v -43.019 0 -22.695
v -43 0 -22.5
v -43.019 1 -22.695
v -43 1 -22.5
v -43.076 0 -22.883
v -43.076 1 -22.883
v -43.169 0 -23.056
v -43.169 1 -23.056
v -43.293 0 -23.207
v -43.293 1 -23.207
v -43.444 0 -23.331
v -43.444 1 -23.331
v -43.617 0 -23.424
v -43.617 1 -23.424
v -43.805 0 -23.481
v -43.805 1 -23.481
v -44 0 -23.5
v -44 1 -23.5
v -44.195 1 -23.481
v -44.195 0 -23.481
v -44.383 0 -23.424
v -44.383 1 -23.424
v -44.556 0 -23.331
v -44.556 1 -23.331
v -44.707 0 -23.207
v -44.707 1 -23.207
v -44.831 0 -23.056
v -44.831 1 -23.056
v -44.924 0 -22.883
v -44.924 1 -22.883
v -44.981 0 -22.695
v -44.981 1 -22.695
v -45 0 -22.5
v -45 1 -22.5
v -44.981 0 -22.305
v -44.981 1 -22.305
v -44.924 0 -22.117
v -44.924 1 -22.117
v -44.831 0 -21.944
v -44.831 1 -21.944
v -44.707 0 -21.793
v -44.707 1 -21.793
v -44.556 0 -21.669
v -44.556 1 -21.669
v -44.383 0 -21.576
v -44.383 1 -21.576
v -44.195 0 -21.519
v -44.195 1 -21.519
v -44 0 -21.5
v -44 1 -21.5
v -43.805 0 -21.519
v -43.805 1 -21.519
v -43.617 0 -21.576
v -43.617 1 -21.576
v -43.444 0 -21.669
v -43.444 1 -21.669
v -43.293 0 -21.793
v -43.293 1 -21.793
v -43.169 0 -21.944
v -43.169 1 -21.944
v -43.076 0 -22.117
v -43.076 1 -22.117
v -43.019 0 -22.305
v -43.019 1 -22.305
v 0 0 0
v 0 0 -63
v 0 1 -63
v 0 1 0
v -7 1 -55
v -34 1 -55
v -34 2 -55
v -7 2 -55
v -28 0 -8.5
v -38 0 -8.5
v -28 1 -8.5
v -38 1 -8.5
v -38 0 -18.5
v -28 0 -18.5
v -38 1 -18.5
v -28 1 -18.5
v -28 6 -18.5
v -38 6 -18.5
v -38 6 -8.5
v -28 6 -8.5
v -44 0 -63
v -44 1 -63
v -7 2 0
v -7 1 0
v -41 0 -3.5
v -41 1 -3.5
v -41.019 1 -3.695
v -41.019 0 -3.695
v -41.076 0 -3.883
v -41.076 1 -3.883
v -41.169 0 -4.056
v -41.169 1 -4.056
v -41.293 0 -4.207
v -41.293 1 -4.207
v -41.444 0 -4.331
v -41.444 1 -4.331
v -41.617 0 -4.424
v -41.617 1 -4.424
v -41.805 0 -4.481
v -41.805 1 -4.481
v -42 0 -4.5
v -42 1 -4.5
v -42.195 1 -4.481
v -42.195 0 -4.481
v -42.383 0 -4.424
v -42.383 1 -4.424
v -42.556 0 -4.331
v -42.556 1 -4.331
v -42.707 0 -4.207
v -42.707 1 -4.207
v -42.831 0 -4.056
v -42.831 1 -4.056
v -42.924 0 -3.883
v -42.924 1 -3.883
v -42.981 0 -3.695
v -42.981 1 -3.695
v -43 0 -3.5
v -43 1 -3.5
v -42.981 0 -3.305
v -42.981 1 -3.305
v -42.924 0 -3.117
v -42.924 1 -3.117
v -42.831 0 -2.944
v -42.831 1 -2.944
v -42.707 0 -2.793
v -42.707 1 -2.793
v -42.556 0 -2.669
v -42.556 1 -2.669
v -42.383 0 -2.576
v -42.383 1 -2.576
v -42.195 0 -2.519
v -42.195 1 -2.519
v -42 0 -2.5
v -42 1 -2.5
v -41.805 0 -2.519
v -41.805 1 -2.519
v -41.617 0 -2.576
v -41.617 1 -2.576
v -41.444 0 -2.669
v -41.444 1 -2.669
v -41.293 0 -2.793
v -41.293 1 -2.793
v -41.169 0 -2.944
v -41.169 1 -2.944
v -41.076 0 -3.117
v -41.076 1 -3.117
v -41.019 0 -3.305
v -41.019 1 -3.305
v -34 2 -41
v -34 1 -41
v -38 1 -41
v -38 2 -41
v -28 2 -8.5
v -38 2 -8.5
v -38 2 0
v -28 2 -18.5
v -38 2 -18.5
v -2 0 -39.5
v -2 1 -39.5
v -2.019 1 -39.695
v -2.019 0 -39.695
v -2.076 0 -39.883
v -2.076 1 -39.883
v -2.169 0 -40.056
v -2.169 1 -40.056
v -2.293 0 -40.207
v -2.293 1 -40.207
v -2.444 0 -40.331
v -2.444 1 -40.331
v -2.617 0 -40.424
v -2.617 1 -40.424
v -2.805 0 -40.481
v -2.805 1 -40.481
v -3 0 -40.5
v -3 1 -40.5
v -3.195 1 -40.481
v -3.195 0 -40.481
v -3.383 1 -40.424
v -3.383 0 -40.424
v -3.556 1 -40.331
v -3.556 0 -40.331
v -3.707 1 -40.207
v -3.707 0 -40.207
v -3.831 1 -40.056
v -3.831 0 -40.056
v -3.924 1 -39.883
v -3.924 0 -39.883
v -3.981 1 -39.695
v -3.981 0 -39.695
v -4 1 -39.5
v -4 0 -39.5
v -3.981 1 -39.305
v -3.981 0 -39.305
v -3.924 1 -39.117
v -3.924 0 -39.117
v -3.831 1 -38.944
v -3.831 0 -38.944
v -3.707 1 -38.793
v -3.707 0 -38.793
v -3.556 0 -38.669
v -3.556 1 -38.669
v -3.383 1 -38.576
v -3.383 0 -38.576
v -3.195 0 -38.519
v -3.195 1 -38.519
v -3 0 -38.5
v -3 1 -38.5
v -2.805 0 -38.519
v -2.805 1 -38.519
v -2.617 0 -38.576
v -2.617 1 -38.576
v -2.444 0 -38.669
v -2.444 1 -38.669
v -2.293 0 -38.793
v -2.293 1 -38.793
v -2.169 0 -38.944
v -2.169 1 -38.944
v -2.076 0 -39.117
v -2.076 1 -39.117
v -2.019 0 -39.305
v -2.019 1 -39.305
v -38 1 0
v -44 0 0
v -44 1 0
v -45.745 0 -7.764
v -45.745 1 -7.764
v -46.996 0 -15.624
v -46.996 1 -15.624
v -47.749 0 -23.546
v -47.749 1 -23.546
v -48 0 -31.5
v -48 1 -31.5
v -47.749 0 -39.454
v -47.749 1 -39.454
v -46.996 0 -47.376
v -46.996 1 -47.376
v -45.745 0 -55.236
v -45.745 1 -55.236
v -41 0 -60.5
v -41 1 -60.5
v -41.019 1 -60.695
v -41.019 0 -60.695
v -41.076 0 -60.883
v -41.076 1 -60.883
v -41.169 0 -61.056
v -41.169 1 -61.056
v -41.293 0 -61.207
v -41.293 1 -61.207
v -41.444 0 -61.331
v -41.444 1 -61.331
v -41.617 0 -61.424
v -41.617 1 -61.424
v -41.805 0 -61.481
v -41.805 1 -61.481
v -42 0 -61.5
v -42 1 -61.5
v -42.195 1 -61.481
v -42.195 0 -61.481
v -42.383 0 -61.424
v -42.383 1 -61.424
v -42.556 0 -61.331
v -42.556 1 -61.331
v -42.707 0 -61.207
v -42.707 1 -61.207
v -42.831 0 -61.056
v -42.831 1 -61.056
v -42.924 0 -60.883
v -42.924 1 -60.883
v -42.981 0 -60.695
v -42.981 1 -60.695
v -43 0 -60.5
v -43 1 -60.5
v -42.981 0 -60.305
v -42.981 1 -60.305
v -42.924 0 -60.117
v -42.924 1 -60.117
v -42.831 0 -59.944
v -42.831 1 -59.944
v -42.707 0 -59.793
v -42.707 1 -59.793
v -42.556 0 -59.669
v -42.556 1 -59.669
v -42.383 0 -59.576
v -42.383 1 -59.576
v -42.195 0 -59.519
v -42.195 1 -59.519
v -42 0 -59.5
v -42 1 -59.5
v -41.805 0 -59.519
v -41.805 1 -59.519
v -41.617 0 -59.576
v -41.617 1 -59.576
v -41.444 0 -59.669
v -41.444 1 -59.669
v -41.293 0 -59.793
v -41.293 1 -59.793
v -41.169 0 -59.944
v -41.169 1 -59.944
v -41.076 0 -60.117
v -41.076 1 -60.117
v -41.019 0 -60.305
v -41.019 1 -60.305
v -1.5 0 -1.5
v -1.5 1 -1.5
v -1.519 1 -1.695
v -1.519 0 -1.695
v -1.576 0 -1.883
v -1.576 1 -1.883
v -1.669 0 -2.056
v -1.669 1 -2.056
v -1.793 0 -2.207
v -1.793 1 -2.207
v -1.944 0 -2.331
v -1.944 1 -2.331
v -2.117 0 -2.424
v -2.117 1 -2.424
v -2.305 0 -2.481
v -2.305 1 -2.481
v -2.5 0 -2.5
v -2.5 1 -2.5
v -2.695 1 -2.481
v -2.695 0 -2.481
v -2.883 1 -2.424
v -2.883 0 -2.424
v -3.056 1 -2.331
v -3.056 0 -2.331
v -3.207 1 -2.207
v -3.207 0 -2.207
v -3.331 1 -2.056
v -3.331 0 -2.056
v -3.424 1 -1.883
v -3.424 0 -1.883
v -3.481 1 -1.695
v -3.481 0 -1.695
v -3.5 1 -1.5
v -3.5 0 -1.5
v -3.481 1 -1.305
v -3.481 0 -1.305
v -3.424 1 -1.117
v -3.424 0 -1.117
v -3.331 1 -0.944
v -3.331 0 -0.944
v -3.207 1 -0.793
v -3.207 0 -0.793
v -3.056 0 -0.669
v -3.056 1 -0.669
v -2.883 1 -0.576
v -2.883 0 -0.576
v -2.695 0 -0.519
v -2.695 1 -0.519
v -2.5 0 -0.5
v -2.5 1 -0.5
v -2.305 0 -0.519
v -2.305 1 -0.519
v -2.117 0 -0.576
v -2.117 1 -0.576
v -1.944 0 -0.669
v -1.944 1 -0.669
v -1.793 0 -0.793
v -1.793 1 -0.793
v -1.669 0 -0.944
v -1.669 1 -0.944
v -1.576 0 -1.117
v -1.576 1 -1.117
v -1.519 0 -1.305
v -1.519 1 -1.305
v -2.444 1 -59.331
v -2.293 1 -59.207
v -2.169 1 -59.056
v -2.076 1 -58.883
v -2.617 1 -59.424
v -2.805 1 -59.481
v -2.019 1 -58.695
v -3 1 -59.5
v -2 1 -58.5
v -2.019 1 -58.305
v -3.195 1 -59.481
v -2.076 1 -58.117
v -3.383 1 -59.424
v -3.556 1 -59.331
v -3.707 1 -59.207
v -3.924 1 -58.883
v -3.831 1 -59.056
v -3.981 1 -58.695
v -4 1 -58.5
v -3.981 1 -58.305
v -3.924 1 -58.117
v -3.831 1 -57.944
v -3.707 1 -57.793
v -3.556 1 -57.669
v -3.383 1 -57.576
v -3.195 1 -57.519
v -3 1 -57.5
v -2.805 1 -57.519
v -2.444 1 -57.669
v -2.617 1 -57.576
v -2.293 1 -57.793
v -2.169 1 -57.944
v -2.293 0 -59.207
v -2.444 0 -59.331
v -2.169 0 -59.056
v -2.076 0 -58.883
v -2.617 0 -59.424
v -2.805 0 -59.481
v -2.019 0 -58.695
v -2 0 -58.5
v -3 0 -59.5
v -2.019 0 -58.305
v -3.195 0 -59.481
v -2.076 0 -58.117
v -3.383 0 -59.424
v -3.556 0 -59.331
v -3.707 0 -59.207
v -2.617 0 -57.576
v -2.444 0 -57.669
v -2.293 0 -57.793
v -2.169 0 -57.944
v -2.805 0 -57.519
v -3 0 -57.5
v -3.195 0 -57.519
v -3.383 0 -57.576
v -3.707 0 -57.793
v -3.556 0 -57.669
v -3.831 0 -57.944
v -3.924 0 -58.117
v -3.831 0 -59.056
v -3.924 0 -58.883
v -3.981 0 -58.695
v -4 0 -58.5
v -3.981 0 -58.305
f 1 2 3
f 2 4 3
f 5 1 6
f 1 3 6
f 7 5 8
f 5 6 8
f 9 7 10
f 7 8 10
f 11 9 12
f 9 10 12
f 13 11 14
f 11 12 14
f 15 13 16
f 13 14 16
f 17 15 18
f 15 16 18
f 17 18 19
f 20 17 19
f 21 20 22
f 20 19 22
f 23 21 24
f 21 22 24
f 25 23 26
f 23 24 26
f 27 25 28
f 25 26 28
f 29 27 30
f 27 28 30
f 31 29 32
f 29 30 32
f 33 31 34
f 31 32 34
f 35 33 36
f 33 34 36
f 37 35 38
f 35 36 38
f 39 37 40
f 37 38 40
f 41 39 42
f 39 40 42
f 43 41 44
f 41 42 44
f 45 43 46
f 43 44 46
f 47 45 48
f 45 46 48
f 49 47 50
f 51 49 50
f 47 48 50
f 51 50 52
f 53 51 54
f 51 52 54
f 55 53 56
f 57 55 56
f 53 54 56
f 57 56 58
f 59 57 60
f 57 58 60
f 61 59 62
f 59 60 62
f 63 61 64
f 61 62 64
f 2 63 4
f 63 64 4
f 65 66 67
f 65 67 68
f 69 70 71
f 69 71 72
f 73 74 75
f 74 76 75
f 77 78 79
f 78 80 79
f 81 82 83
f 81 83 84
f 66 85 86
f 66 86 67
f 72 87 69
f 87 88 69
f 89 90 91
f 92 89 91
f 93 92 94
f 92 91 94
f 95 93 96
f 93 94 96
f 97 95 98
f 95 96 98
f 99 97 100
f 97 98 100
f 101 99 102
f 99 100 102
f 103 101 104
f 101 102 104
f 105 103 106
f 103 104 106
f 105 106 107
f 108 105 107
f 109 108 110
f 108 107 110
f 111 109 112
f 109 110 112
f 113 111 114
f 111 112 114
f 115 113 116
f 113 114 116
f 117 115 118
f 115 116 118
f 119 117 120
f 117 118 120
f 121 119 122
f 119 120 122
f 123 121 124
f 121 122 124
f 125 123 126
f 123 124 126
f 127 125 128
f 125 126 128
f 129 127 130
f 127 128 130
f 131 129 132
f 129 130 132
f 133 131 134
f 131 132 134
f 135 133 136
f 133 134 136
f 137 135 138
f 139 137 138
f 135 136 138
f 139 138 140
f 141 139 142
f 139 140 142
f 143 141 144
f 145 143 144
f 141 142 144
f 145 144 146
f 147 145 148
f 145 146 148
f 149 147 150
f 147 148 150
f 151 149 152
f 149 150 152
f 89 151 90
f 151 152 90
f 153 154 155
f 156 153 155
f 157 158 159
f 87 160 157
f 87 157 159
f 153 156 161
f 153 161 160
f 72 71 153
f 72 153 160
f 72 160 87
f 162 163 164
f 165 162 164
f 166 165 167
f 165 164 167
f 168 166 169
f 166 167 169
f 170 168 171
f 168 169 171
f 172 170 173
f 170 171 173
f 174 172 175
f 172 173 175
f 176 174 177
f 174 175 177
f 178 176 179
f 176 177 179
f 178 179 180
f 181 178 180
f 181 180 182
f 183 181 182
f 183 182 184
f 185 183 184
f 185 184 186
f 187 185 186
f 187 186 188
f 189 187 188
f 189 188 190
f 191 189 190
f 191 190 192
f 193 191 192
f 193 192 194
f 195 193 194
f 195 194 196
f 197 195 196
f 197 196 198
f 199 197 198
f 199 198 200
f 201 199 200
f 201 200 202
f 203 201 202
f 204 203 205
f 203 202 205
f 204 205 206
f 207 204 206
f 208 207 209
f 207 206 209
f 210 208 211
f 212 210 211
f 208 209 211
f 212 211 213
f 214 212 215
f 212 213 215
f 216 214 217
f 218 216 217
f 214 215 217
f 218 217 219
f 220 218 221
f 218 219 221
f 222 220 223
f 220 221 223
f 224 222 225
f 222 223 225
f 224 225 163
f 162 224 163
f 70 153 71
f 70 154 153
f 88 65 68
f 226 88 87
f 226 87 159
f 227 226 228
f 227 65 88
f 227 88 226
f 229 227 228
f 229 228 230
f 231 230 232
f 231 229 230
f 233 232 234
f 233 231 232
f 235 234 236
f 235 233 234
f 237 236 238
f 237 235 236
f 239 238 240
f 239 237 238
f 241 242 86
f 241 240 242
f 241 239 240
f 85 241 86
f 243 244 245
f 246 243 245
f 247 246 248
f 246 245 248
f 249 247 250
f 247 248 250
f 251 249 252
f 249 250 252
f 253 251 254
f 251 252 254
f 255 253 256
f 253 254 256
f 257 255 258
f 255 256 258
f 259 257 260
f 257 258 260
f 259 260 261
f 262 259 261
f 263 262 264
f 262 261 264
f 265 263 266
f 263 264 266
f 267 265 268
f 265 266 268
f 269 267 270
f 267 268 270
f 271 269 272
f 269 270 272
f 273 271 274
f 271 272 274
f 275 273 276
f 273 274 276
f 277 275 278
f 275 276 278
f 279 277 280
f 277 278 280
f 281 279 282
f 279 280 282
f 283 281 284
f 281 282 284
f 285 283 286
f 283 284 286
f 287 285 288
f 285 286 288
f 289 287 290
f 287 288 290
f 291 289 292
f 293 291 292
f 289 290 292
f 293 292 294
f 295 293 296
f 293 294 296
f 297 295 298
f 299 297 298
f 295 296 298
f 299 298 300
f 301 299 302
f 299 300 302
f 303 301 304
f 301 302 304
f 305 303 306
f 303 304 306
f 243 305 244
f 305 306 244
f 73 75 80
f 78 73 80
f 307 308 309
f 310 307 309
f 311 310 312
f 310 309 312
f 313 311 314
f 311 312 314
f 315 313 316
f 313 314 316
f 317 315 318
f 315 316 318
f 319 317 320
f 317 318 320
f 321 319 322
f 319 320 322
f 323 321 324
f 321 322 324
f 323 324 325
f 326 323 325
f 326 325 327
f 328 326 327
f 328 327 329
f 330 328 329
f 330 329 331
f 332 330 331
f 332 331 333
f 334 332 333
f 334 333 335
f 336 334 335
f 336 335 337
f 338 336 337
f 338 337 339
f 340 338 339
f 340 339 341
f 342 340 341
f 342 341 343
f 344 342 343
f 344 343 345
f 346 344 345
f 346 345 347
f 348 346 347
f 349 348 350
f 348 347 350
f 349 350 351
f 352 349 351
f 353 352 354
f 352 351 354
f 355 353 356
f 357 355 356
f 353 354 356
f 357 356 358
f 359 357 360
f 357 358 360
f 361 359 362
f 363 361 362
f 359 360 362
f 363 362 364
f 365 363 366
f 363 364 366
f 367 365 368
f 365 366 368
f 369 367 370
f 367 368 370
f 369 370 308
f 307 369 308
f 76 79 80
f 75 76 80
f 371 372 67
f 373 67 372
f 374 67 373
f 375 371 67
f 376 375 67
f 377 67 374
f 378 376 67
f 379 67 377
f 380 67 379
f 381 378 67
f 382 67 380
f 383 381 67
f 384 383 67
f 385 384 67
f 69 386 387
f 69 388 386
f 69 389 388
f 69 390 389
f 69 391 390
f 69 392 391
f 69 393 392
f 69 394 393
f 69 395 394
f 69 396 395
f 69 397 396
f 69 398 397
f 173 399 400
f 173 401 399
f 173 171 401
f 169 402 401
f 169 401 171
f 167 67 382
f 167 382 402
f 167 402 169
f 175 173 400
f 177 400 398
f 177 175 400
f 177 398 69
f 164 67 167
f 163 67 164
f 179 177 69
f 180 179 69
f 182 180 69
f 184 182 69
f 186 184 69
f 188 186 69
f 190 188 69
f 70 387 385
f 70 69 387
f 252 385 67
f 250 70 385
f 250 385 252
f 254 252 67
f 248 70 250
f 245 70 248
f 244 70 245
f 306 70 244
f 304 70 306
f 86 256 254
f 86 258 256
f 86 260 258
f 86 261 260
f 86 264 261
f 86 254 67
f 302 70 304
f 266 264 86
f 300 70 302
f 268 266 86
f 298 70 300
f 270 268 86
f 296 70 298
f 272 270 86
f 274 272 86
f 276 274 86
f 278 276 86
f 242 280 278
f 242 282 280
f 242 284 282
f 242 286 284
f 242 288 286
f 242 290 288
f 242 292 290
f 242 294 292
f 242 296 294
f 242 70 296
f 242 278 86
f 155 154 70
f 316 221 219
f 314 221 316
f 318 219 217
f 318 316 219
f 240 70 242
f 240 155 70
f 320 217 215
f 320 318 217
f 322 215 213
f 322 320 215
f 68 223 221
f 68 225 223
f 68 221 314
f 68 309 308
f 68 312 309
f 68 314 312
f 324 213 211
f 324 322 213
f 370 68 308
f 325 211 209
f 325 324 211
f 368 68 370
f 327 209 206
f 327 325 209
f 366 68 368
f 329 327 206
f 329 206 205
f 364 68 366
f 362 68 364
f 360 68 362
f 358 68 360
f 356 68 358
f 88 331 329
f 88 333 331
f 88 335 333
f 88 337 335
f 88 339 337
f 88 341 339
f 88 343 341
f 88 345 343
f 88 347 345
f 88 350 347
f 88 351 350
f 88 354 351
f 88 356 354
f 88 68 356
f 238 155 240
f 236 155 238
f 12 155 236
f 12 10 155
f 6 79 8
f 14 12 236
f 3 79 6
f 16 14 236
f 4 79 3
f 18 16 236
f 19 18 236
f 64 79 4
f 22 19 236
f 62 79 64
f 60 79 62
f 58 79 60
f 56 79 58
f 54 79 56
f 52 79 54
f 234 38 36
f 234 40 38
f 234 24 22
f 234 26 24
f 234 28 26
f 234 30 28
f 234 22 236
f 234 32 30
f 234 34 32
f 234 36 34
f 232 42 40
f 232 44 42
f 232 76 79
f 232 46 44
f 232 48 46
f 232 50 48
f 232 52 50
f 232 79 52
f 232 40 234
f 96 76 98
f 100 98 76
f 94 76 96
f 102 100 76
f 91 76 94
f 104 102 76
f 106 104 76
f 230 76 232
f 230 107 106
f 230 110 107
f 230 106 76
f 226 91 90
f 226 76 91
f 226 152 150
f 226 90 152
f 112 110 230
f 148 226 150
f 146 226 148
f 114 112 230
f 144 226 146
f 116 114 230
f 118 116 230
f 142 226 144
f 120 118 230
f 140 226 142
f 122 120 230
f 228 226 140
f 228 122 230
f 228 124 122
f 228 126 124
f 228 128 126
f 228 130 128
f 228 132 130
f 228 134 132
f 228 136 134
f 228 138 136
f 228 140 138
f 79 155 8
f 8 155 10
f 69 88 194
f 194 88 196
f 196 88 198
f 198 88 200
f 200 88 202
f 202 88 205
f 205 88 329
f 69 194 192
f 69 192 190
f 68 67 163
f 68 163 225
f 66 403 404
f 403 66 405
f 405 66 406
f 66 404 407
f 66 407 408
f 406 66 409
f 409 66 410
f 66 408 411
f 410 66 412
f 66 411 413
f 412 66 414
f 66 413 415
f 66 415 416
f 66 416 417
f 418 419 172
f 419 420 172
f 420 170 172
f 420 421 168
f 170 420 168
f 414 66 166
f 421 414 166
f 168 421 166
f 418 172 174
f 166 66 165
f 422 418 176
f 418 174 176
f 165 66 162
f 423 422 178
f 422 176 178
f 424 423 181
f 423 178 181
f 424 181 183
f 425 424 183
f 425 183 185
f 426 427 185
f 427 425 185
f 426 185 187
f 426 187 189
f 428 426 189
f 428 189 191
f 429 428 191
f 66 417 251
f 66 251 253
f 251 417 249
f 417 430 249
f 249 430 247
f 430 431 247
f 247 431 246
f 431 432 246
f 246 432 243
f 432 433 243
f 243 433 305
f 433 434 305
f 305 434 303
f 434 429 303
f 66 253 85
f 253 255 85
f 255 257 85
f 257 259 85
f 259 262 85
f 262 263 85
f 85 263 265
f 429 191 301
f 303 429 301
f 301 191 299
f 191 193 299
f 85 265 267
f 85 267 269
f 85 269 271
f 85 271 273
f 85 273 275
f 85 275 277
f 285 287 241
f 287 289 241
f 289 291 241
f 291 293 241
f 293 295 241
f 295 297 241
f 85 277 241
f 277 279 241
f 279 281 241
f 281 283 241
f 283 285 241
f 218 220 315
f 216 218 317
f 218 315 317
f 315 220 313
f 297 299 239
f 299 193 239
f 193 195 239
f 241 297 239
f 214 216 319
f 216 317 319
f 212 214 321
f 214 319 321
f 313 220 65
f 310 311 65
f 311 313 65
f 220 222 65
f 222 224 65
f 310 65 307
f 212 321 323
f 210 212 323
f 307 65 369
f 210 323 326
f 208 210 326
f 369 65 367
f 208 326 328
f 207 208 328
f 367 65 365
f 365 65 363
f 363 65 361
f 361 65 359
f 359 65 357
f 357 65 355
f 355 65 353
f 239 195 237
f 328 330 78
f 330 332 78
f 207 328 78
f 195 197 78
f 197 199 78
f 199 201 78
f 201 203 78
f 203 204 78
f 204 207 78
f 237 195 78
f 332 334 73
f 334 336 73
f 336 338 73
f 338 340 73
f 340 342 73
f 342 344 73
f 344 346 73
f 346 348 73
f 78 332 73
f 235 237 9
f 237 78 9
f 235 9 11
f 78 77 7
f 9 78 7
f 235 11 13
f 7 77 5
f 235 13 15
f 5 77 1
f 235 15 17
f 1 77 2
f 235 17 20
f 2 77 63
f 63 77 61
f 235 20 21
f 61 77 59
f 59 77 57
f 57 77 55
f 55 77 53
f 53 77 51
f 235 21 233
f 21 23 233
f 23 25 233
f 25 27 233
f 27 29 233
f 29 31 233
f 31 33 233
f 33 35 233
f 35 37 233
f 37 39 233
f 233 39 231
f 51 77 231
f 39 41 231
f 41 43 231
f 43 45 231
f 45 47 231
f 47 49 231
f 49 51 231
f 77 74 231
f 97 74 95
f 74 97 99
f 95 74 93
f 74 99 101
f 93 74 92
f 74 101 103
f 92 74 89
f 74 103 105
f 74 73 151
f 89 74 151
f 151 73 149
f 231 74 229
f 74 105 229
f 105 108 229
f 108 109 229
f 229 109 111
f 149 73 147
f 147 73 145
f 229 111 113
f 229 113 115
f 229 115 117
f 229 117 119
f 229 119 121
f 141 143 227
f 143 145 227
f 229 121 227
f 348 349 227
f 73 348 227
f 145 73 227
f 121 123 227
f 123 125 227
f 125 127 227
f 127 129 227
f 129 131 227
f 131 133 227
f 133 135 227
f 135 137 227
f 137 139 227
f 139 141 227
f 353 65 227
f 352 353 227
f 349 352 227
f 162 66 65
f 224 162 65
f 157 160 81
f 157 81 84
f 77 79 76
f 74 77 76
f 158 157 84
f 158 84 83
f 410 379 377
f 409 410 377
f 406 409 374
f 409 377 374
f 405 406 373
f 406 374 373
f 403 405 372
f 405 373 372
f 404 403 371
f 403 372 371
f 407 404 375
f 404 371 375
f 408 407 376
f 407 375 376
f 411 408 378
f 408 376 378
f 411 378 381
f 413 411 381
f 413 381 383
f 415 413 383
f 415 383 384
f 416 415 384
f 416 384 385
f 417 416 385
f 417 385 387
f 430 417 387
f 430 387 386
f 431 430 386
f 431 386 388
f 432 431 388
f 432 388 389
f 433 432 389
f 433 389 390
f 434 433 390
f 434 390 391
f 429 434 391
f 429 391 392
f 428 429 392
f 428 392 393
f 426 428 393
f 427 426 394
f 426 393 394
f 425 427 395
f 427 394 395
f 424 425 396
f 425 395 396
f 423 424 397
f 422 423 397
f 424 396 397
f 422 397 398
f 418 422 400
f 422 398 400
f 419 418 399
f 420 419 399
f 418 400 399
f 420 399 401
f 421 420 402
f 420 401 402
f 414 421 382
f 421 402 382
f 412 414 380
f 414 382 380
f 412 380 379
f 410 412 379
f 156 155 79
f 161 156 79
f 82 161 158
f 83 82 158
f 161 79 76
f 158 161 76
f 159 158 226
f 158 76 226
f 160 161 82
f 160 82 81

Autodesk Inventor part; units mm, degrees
ref_plane "YZ Plane" through (0, 0, 0) normal (1, 0, 0) x (0, 1, 0)
ref_plane "XZ Plane" through (0, 0, 0) normal (0, 1, 0) x (-1, 0, 0)
ref_plane "XY Plane" through (0, 0, 0) normal (0, 0, 1) x (1, 0, 0)
sketch "Skizze1" plane through (0, 0, 0) normal (0, 1, 0) x (-1, 0, 0)
  line L0 (0, 0) -> (48, 0)
  line L1 (48, 0) -> (48, -63) construction
  line L2 (48, -63) -> (0, -63)
  line L3 (0, -63) -> (0, 0)
  arc A0 (44, -63) -> (44, 0) centre (-78.0312, -31.5) ccw
  line L4 (44, 0) -> (44, -63) construction
  line L5 (44, 0) -> (107, 0) construction
  dimension "d0" = 48
  dimension "d1" = 63
  dimension "d2" = 90
extrude "Extrusion1" add sketch "Skizze1" along normal blind 1
sketch "Skizze2" plane through (0, 1, 0) normal (0, 1, 0) x (1, 0, 0)
  line L0 (-44, 0) -> (0, 0) projected
  line L1 (0, 0) -> (0, 63) projected
  line L2 (0, 63) -> (-44, 63) projected
  arc A0 (-44, 63) -> (-44, 0) centre (78.0312, 31.5) ccw projected
  circle A1 centre (-42, 3.5) radius 1
  circle A2 centre (-2.5, 1.5) radius 1
  circle A3 centre (-44, 22.5) radius 1
  circle A4 centre (-42, 60.5) radius 1
  circle A5 centre (-3, 58.5) radius 1
  circle A6 centre (-3, 39.5) radius 1
  line L3 (-38, 8.5) -> (-28, 8.5)
  line L4 (-28, 8.5) -> (-28, 18.5)
  line L5 (-28, 18.5) -> (-38, 18.5)
  line L6 (-38, 18.5) -> (-38, 8.5)
  point P0 (0, 0)
  dimension "d5" = 2
  dimension "d6" = 3.5
  dimension "d7" = 2
  dimension "d8" = 2
  dimension "d9" = 2
  dimension "d10" = 39.5
  dimension "d11" = 2
  dimension "d12" = 2
  dimension "d13" = 19
  dimension "d14" = 2
  dimension "d15" = 57
  dimension "d16" = 2
  dimension "d17" = 2
  dimension "d18" = 39
  dimension "d19" = 2
  dimension "d20" = 19
  dimension "d21" = 10
  dimension "d22" = 10
  dimension "d23" = 5
  dimension "d24" = 4
extrude "Extrusion2" cut sketch "Skizze2" against normal through all contours A1 | A2 | A3 | A4 | A5 | A6 | L6 L5 L4 L3
sketch "Skizze3" plane through (0, 1, 0) normal (0, 1, 0) x (1, 0, 0)
  circle A0 centre (-3, 39.5) radius 1 projected
  circle A1 centre (-42, 60.5) radius 1 projected
  circle A2 centre (-2.5, 1.5) radius 1 projected
  circle A3 centre (-42, 3.5) radius 1 projected
  circle A4 centre (-44, 22.5) radius 1 projected
  circle A5 centre (-3, 58.5) radius 1 projected
  line L0 (-28, 18.5) -> (-28, 8.5) projected
  line L1 (-28, 8.5) -> (-38, 8.5) projected
  line L2 (-38, 8.5) -> (-38, 18.5) projected
  line L3 (-38, 18.5) -> (-28, 18.5) projected
  line L4 (-44, 0) -> (0, 0) projected
  line L5 (0, 0) -> (0, 63) projected
  line L6 (0, 63) -> (-44, 63) projected
  arc A6 (-44, 63) -> (-44, 0) centre (78.0312, 31.5) ccw projected
  line L7 (-28, 8.5) -> (-38, 8.5) projected
  line L8 (-38, 8.5) -> (-28, 8.5)
  line L9 (-28, 8.5) -> (-28, 18.5)
  line L10 (-28, 18.5) -> (-38, 18.5)
  line L11 (-38, 18.5) -> (-38, 8.5)
  line L12 (-38, 0) -> (-7, 0)
  line L13 (-7, 0) -> (-7, 41)
  line L14 (-7, 41) -> (-38, 41)
  line L15 (-38, 41) -> (-38, 0)
  line L16 (-7, 41) -> (-34, 41)
  line L17 (-34, 41) -> (-34, 55)
  line L18 (-34, 55) -> (-7, 55)
  line L19 (-7, 55) -> (-7, 41)
  point P0 (0, 0)
  dimension "d27" = 31
  dimension "d28" = 41
  dimension "d31" = 27
  dimension "d32" = 8
extrude "Extrusion3" add sketch "Skizze3" along normal blind 1 contours L3 L15 L14 L13 L4 L1 L0 | L0 L1 L2 L3 | L17 L18 L19 L14
sketch "Skizze4" plane through (0, 2, 0) normal (0, 1, 0) x (1, 0, 0)
  line L0 (-38, 18.5) -> (-28, 18.5) projected
  line L1 (-28, 18.5) -> (-28, 8.5) projected
  line L2 (-28, 8.5) -> (-38, 8.5) projected
  line L3 (-38, 8.5) -> (-38, 18.5) projected
  point P0 (0, 0)
extrude "Extrusion4" add sketch "Skizze4" along normal blind 4
properties part number "00_Backplate"
